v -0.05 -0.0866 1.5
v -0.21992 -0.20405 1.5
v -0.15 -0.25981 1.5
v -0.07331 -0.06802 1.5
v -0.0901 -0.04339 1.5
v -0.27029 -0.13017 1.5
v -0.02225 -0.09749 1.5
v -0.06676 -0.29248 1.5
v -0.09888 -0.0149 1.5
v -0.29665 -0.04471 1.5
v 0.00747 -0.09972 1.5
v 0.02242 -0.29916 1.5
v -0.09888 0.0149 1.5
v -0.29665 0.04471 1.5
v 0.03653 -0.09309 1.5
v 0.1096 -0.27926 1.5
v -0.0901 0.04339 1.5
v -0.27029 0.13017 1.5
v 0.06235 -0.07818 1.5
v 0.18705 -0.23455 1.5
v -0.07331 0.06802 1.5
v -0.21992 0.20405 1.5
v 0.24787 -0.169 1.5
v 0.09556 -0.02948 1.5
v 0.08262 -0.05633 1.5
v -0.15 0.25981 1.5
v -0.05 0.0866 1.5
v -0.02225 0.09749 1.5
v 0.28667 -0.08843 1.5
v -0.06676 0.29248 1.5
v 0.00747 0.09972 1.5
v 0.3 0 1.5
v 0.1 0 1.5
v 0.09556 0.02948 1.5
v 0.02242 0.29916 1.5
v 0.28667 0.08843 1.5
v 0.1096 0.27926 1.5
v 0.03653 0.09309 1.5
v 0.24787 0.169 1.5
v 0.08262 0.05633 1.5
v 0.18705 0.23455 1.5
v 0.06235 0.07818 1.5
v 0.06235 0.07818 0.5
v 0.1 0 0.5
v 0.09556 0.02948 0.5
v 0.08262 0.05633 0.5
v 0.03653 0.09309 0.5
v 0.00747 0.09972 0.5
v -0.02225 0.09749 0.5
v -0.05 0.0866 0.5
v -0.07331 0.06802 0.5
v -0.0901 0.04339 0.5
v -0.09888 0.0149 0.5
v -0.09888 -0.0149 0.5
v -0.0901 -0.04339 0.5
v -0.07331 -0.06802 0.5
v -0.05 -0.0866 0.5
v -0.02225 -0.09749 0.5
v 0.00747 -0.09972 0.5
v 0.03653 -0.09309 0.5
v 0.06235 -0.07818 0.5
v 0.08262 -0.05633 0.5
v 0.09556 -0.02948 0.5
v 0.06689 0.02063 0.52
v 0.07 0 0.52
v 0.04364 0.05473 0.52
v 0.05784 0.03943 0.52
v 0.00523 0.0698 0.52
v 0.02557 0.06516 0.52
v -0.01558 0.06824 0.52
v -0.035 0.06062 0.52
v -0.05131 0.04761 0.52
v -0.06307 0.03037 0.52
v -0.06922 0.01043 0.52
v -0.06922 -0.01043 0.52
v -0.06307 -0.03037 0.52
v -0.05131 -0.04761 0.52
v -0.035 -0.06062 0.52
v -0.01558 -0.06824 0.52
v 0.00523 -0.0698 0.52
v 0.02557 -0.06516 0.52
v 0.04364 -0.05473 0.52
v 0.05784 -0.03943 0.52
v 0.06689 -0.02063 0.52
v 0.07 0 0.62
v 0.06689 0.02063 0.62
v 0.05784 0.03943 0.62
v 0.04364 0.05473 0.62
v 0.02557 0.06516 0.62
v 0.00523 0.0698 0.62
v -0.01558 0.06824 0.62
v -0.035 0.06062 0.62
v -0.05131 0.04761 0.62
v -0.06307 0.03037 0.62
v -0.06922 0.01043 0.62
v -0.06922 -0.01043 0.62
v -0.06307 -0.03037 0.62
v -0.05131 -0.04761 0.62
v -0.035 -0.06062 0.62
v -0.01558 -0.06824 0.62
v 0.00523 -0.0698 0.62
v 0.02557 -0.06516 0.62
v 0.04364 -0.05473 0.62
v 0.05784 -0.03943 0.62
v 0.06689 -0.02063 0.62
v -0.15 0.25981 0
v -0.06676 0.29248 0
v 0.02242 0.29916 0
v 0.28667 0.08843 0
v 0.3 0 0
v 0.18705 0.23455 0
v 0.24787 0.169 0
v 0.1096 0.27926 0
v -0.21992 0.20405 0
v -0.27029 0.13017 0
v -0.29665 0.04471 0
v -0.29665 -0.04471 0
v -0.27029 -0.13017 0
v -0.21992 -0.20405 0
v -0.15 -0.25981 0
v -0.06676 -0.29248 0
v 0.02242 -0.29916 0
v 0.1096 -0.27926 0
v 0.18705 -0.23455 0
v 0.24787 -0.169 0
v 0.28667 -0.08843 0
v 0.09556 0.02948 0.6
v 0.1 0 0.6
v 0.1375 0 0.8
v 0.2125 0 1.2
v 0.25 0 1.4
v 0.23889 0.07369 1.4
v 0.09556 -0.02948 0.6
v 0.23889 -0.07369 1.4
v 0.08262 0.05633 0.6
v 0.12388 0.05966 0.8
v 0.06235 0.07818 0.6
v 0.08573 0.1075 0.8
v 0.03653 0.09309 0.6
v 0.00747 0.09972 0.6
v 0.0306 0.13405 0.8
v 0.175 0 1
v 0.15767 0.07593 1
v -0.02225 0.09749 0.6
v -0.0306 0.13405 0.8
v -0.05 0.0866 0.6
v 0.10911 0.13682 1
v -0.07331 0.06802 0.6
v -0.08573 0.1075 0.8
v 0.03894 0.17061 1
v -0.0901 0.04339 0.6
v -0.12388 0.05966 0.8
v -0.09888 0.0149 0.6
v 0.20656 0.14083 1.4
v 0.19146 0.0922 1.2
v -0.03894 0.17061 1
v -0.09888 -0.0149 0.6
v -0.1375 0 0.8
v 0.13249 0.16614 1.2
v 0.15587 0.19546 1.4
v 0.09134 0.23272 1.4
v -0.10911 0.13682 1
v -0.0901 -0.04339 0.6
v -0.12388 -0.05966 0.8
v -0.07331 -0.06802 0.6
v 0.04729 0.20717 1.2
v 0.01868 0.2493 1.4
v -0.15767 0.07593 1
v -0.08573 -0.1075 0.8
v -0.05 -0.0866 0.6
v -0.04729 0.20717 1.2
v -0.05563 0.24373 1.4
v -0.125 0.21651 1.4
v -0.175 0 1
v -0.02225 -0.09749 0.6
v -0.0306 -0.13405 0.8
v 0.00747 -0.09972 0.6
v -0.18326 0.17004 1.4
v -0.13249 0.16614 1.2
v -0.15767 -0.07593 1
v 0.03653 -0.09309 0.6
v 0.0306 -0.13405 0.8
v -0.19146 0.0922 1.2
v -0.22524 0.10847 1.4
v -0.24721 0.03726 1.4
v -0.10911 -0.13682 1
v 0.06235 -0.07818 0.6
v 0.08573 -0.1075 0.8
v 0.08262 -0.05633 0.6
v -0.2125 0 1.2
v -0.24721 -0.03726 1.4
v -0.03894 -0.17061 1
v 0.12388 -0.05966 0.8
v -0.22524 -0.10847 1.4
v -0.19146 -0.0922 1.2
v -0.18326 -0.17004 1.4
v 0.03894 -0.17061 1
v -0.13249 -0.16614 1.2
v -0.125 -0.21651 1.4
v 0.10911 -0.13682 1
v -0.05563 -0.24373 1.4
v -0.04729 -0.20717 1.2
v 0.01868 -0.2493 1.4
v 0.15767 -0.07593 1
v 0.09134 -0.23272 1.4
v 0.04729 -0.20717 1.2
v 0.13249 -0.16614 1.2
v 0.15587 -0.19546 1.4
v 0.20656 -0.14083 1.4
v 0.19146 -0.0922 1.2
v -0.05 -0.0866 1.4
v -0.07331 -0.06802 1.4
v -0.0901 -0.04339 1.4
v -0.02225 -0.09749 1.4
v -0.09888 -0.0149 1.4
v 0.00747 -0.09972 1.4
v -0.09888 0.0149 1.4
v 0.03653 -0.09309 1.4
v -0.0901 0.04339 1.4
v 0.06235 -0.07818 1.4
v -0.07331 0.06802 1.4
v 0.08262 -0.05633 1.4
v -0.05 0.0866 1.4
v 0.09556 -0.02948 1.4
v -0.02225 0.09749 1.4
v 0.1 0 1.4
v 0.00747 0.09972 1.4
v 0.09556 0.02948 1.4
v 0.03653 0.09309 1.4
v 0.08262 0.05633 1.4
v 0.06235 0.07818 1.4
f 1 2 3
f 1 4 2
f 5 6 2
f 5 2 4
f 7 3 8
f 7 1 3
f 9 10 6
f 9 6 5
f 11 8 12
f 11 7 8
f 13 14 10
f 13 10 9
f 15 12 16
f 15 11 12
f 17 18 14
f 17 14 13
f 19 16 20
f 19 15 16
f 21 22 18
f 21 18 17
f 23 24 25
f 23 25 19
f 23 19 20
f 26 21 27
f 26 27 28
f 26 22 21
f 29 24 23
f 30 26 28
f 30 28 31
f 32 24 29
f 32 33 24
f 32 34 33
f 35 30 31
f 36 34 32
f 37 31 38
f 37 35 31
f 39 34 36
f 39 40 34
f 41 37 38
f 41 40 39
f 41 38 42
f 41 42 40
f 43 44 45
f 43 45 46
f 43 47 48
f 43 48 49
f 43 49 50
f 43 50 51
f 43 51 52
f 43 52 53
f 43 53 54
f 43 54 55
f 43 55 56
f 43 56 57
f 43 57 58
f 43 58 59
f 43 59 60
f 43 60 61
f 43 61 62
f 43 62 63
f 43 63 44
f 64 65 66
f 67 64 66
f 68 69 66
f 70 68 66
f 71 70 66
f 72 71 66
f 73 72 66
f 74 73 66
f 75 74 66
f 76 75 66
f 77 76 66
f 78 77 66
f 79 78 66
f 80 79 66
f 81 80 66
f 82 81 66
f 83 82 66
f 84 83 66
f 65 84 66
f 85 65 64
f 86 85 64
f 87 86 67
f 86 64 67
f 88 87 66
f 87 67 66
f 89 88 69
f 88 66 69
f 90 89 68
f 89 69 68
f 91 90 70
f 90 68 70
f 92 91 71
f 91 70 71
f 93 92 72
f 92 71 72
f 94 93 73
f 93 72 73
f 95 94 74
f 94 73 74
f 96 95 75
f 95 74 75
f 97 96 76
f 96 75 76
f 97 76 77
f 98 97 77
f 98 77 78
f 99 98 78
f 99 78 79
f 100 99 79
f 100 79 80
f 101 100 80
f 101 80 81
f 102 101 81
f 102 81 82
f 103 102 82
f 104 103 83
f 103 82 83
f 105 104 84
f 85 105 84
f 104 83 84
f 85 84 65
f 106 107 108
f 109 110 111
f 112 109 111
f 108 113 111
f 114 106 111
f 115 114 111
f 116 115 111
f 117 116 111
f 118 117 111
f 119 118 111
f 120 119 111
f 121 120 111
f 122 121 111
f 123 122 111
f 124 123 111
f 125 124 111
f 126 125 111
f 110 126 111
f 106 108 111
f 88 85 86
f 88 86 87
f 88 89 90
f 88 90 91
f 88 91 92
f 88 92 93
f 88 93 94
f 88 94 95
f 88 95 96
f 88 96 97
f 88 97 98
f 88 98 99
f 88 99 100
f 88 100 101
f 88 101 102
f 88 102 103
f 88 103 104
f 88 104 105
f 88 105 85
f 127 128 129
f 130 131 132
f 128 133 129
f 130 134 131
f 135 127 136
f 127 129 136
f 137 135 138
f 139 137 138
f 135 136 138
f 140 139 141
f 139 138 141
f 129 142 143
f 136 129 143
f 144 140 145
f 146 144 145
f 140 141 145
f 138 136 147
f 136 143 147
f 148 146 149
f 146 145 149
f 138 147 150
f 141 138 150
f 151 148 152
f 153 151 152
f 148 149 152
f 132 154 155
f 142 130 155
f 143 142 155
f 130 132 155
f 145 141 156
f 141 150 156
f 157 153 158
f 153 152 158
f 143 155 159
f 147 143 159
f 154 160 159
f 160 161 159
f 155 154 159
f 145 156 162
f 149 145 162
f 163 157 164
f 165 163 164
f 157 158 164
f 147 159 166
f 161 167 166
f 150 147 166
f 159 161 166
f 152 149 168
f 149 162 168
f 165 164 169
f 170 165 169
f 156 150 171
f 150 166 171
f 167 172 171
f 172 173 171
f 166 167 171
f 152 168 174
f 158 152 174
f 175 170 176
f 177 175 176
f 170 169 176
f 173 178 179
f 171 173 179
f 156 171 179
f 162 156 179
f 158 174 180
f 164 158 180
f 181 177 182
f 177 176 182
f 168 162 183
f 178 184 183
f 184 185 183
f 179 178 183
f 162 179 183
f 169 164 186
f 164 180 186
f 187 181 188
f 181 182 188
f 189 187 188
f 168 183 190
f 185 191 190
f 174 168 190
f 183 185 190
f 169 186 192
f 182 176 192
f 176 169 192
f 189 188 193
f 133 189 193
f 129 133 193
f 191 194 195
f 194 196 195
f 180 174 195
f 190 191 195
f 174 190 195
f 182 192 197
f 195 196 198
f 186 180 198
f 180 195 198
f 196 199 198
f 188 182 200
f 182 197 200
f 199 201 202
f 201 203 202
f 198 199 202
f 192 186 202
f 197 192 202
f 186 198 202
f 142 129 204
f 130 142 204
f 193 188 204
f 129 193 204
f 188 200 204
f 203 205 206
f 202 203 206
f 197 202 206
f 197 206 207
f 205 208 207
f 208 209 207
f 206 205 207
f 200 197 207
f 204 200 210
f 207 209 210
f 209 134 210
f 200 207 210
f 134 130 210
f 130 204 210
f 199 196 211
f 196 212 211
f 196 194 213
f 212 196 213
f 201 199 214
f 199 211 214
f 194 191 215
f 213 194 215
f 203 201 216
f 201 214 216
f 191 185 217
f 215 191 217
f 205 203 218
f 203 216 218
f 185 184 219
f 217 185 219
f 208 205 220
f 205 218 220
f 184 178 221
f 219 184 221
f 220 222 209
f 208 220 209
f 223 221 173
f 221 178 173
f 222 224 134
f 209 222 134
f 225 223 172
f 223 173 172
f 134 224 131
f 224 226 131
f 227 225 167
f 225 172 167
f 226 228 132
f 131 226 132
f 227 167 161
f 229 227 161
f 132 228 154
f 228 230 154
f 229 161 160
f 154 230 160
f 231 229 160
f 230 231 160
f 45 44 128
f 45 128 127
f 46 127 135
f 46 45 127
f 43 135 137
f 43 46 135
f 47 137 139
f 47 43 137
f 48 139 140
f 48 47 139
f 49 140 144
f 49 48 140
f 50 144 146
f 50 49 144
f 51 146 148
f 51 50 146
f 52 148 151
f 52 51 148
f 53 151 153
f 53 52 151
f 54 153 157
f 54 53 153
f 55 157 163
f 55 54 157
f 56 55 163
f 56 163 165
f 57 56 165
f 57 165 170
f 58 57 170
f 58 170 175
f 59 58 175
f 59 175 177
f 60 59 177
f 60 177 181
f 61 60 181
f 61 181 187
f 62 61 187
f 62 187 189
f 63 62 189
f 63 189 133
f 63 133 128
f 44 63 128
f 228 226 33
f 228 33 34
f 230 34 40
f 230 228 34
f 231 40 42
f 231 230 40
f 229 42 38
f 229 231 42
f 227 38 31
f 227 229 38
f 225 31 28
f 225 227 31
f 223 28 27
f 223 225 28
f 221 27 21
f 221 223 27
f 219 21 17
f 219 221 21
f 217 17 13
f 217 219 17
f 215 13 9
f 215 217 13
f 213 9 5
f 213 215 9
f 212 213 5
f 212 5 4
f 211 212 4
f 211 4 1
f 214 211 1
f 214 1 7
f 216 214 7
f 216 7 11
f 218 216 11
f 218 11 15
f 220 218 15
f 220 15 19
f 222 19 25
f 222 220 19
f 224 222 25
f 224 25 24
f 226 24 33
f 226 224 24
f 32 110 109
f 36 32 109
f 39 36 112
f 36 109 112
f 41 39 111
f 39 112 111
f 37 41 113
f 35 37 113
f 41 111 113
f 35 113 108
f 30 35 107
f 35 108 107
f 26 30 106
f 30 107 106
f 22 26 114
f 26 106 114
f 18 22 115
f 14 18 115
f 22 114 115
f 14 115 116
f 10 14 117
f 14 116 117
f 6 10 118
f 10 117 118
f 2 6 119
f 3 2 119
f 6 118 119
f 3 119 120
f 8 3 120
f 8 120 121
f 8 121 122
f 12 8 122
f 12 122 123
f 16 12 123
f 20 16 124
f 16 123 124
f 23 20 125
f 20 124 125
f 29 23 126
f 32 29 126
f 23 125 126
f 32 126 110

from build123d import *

# Parameters (mm, degrees)
CYLINDER002_R     = 0.07
CYLINDER002_DEPTH = 0.1
CYLINDER003_R     = 0.1
CYLINDER003_DEPTH = 2
CYLINDER_R        = 0.3
CYLINDER_DEPTH    = 1.5


with BuildPart() as emitting_region:
    # Cylinder002 → Cylinder002 (new body)
    with BuildSketch(Plane.XY.offset(0.52)):
        Circle(CYLINDER002_R)
    extrude(amount=CYLINDER002_DEPTH)


with BuildPart() as cylinder001:
    # Cylinder003 → Cylinder003 (new body)
    with BuildSketch(Plane.XY.offset(0.5)):
        Circle(CYLINDER003_R)
    extrude(amount=CYLINDER003_DEPTH)


with BuildPart() as fusion:
    # Cone → Cone (revolve)
    with BuildSketch(Plane(origin=(0, 0, 0.6), x_dir=(1, 0, 0), z_dir=(0, -1, 0))):
        Polygon((0, 0), (0.1, 0), (0.25, 0.8), (0, 0.8), align=None)
    revolve(axis=Axis((0, 0, 0.6), (0, 0, 1)))

    # Fusion: union Cylinder001
    add(cylinder001.part)


with BuildPart() as cut:
    # Cylinder → Cylinder (new body)
    with BuildSketch(Plane.XY):
        Circle(CYLINDER_R)
    extrude(amount=CYLINDER_DEPTH)

    # Cut: cut Fusion
    add(fusion.part, mode=Mode.SUBTRACT)


solid = Compound([emitting_region.part, cut.part])
